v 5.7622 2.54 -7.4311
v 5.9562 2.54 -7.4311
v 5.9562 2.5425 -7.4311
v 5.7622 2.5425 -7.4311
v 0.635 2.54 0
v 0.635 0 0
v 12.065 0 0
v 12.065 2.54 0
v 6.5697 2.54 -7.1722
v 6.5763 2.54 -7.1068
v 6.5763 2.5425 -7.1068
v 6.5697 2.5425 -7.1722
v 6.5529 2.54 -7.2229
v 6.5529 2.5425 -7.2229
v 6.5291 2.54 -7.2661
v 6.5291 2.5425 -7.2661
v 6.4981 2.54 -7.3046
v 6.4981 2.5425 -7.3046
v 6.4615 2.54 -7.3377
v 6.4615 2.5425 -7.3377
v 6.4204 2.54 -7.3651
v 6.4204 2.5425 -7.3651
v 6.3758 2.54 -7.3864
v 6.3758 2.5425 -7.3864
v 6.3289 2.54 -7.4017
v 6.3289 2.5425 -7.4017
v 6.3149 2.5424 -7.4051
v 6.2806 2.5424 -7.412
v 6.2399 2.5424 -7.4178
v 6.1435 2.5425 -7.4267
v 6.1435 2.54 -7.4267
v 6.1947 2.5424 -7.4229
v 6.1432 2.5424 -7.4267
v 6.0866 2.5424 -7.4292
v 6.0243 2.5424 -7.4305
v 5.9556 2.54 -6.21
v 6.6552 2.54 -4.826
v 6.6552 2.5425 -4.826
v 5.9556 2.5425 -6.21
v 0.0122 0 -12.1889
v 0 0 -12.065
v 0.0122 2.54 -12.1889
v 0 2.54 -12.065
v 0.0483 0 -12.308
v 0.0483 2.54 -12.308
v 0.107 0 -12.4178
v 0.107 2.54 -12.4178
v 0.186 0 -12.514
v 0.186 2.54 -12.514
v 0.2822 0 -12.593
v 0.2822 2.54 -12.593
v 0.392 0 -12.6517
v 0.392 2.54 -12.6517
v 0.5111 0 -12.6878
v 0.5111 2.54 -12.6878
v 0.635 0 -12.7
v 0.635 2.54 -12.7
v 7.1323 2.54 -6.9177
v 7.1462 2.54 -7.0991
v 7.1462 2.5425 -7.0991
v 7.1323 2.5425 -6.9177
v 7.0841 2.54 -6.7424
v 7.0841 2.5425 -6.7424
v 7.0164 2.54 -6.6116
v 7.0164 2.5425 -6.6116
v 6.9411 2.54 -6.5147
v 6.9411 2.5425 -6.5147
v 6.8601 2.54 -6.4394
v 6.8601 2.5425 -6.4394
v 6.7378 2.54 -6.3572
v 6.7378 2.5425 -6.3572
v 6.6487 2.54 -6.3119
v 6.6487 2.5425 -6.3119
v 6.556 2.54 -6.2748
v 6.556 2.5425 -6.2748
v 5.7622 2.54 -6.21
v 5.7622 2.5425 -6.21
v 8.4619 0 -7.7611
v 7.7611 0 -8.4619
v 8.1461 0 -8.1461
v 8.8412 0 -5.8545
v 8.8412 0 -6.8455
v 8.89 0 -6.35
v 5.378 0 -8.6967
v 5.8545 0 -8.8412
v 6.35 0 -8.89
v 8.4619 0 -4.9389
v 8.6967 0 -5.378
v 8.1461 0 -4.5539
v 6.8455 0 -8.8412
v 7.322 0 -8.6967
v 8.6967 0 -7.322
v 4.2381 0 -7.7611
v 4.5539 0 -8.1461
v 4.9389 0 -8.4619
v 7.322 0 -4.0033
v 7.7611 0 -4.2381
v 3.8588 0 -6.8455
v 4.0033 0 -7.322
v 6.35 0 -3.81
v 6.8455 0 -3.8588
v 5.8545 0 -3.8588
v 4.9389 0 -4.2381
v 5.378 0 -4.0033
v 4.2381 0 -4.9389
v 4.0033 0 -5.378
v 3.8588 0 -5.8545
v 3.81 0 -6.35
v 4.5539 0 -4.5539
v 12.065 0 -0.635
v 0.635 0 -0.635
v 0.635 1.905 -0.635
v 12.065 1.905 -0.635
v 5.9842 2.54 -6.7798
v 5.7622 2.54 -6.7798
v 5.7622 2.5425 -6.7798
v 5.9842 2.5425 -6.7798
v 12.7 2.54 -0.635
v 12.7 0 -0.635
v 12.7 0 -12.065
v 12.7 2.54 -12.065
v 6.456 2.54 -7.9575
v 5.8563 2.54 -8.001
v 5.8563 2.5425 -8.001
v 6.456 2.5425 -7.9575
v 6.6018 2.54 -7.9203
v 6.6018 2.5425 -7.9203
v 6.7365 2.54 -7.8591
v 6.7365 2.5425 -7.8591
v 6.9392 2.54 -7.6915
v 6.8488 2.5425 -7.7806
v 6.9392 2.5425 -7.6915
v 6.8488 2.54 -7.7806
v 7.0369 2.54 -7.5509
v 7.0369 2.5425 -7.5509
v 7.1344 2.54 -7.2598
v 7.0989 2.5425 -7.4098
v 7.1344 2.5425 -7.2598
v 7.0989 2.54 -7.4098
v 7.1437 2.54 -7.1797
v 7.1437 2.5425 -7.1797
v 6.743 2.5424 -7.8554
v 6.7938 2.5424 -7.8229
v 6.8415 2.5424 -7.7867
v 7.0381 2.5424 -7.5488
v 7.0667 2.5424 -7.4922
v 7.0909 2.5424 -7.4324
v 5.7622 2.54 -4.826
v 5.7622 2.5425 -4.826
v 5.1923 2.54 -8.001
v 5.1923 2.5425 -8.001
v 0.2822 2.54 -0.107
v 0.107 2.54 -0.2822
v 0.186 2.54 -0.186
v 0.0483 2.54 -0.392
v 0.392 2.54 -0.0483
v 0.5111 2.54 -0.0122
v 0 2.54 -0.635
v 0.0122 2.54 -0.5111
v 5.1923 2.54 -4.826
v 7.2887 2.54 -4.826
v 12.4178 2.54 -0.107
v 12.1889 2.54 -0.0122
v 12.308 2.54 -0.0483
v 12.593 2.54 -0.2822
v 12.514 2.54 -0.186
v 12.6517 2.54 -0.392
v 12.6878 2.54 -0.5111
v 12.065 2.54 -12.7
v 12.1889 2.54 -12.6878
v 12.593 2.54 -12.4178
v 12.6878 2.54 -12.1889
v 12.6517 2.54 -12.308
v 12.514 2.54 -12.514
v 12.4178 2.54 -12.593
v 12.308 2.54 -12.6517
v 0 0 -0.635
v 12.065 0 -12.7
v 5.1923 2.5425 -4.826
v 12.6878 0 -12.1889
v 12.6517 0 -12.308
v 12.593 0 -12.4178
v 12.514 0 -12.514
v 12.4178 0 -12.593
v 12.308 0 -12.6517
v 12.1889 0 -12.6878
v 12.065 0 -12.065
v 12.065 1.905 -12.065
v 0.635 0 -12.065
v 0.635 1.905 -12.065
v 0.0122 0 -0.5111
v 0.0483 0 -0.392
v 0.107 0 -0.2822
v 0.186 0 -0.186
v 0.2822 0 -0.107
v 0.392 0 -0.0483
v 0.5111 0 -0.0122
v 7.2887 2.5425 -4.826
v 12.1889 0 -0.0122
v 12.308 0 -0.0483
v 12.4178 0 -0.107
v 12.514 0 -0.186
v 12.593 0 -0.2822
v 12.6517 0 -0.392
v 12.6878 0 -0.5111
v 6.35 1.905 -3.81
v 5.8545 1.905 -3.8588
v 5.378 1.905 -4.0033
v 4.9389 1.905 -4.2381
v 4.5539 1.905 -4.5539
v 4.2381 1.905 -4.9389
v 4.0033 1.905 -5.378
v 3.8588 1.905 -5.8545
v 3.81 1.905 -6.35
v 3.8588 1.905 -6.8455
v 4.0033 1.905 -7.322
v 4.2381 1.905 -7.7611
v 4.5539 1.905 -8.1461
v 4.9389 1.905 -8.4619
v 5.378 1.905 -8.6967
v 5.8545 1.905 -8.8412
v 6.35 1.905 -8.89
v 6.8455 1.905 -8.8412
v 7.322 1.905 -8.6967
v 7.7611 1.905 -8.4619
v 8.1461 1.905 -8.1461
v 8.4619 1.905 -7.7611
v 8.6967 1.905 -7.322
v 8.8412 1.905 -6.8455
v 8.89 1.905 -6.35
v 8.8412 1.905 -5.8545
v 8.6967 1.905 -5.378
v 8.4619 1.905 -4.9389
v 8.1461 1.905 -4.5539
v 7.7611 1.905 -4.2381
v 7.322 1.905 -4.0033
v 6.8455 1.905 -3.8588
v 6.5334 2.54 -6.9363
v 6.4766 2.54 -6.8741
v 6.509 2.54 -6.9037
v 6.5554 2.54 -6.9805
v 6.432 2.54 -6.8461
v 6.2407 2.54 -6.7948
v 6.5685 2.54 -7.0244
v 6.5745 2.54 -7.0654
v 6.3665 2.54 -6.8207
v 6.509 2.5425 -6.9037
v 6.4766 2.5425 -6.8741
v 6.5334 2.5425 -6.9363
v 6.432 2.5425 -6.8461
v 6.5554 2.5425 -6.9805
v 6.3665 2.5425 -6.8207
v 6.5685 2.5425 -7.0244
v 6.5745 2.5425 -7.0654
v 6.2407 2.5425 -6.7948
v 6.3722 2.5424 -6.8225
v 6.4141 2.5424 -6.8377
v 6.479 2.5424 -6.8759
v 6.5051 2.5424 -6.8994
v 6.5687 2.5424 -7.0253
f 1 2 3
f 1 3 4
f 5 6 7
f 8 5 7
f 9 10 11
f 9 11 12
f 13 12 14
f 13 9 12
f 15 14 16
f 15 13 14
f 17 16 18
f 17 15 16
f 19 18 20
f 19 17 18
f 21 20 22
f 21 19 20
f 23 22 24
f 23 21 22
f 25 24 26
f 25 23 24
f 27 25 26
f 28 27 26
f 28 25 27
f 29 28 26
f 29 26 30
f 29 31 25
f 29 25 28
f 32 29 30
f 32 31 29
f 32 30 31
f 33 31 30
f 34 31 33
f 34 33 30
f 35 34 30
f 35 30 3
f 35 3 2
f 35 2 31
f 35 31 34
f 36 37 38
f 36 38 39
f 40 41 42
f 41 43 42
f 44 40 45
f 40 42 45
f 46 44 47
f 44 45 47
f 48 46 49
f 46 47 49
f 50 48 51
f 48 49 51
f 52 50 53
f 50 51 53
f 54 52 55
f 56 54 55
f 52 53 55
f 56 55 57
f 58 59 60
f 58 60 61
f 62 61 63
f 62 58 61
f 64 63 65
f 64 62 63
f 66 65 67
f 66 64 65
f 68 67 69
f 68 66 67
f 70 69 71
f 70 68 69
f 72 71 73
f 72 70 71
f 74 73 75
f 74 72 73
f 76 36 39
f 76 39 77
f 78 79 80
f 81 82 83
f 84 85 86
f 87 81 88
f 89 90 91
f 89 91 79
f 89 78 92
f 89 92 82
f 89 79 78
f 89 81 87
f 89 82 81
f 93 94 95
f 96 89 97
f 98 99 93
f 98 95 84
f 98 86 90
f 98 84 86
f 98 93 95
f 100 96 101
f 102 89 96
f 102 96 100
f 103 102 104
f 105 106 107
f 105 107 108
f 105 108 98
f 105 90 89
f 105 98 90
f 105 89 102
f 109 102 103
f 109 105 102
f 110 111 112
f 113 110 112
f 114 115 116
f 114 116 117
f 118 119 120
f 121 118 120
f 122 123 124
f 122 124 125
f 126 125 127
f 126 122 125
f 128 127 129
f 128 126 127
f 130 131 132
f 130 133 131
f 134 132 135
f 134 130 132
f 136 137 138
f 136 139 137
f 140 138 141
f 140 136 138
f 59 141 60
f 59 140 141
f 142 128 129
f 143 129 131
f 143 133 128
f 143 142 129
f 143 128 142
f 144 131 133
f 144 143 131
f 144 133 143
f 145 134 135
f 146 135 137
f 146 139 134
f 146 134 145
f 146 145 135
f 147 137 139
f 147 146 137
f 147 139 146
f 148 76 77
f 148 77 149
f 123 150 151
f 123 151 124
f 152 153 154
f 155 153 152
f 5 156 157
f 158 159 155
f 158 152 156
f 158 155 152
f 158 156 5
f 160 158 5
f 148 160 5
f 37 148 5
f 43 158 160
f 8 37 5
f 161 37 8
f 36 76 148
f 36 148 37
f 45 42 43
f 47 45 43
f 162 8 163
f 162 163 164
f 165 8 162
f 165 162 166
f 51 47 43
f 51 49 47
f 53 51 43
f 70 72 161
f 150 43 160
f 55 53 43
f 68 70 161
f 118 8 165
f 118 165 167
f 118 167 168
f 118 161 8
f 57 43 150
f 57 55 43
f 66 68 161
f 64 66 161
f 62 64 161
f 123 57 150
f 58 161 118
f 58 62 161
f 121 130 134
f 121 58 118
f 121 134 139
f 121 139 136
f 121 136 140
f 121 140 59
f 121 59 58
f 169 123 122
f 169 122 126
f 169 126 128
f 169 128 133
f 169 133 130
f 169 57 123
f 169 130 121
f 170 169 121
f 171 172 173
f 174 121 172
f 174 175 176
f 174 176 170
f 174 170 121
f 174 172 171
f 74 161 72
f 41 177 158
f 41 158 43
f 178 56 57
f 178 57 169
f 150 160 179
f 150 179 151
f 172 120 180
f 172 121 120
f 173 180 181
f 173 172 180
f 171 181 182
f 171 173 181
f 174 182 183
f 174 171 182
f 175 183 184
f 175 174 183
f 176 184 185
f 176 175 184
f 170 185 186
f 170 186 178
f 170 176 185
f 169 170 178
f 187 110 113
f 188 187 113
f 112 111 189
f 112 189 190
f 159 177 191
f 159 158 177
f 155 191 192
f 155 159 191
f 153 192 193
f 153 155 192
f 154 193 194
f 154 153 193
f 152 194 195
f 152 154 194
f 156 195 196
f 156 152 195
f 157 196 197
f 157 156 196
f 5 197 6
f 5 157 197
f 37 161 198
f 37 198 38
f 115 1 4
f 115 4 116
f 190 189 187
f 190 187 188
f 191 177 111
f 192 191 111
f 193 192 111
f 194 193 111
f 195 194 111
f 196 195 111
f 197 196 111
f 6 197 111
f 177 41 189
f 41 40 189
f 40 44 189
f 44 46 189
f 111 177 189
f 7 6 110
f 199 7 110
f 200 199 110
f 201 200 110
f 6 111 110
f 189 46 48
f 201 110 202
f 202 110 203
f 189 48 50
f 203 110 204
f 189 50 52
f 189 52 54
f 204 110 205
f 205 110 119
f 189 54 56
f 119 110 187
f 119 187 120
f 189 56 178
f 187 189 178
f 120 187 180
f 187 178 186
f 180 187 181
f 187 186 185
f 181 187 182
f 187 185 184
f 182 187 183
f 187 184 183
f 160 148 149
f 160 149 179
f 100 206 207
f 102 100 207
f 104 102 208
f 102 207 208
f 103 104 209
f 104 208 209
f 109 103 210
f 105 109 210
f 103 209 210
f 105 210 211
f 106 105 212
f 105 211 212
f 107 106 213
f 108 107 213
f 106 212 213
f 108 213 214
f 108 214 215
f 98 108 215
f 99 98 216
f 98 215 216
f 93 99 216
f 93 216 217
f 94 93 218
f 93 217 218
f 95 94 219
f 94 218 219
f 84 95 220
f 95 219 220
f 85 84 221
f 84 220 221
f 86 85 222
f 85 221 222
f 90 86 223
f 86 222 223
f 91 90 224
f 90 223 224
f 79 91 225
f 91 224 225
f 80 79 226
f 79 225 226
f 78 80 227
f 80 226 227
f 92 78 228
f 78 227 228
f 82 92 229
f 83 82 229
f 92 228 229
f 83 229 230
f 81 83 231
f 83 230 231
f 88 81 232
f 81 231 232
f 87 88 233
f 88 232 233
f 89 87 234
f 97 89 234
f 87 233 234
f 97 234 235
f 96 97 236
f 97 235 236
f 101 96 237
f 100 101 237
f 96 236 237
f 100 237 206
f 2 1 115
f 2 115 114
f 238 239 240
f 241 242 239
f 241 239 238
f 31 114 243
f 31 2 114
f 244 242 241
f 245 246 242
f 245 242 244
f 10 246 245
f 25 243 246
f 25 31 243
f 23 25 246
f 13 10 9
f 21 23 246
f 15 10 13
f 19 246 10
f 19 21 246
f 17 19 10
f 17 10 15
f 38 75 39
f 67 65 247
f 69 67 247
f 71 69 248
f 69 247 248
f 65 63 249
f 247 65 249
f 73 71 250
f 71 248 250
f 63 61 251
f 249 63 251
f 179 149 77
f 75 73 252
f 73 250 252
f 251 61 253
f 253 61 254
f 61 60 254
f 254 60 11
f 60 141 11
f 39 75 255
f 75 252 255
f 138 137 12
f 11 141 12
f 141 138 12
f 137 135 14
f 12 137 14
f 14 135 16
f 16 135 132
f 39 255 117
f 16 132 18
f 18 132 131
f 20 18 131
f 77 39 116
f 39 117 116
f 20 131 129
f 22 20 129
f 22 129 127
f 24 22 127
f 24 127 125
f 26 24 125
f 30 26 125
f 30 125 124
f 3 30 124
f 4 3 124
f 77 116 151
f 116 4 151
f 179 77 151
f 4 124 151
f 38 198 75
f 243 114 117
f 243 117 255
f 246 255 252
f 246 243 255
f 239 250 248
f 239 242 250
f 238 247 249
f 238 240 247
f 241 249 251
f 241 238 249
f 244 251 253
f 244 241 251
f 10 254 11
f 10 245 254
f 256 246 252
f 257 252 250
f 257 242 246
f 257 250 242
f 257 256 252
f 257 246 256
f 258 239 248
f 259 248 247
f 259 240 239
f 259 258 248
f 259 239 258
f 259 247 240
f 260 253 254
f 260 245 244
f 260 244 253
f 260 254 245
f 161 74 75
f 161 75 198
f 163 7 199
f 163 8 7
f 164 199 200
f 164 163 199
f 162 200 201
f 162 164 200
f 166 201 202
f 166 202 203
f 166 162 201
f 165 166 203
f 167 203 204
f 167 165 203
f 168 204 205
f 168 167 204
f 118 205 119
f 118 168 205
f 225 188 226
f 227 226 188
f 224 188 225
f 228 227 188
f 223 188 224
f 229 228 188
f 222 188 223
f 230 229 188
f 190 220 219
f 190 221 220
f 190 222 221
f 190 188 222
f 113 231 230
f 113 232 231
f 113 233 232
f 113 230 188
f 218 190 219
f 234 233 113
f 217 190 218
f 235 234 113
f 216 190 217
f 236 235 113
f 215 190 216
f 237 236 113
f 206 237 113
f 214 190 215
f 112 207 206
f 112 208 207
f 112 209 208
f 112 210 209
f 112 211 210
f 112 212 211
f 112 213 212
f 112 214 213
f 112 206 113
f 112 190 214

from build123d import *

# Parameters (mm, degrees)
SKETCH1_W           = 12.7
SKETCH1_H           = 12.7
BOSS_EXTRUDE1_DEPTH = 2.54
FILLET1_R           = 0.635
SHELL1_START        = 0.635
SHELL1_OUTLINE_W    = 1.905
SHELL1_OUTLINE_H    = 11.43
SHELL1_DEPTH        = 11.43
SKETCH2_R           = 2.54
BOSS_EXTRUDE2_DEPTH = 1.905
BOSS_EXTRUDE3_DEPTH = 0.00254


# Read off the part's stored shape, not the designer's step: Shell1
with BuildPart() as part:
    # Sketch1 → Boss-Extrude1 (new body)
    with BuildSketch(Plane(origin=(0, 0, 0), x_dir=(1, 0, 0), z_dir=(0, 1, 0))):
        with Locations((6.35, 6.35)):
            Rectangle(SKETCH1_W, SKETCH1_H)
    extrude(amount=BOSS_EXTRUDE1_DEPTH)

    # Fillet1
    fillet1_edges = [part.edges().sort_by_distance(p)[0] for p in [
        (0, 1.27, -12.7),
        (12.7, 1.27, -12.7),
        (12.7, 1.27, 0),
        (0, 1.27, 0),
    ]]
    fillet(fillet1_edges, radius=FILLET1_R)

    # Shell1 outline → Shell1 (cut)
    with BuildSketch(Plane.YZ.offset(SHELL1_START)):
        with Locations((0.9525, -6.35)):
            Rectangle(SHELL1_OUTLINE_W, SHELL1_OUTLINE_H)
    extrude(amount=SHELL1_DEPTH, mode=Mode.SUBTRACT)

    # Sketch2 → Boss-Extrude2 (add)
    with BuildSketch(Plane(origin=(0, 1.905, 0), x_dir=(-1, 0, 0), z_dir=(0, -1, 0))):
        with Locations(Location((-6.35, 6.35, 0), (0, 0, 270))):
            Circle(SKETCH2_R)
    extrude(amount=BOSS_EXTRUDE2_DEPTH)

    # Sketch3 → Boss-Extrude3 (add)
    with BuildSketch(Plane(origin=(0, 2.54, 0), x_dir=(1, 0, 0), z_dir=(0, 1, 0))):
        with BuildLine():
            Line((5.192346154, 8.001), (5.856348558, 8.001))
            add(Edge.make_bspline(
                [(5.856348558, 8.001), (5.900238914, 8.000844214), (5.984652434, 8.000544595), (6.106372118, 7.995817392), (6.218188387, 7.989239101), (6.320266796, 7.979200455), (6.412563672, 7.965890424), (6.49517152, 7.950200099), (6.568087924, 7.93231761), (6.631927834, 7.910034619), (6.689540196, 7.884899742), (6.743242928, 7.856019307), (6.79422079, 7.823714908), (6.842133051, 7.787136528), (6.887396081, 7.746942202), (6.93009527, 7.703091473), (6.969627239, 7.655212502), (7.005747205, 7.603607826), (7.038667646, 7.54932089), (7.067762412, 7.492277157), (7.091422324, 7.432436959), (7.112328392, 7.370665114), (7.127386356, 7.306078583), (7.13785895, 7.239306125), (7.145526573, 7.170112696), (7.145967424, 7.123105753), (7.146192308, 7.099127003)],
                knots=[0, 0, 0, 0, 1.749336639, 3.364467119, 4.854658419, 6.213483162, 7.451590619, 8.570285859, 9.5643256, 10.440900261, 11.26203566, 12.067320669, 12.869050712, 13.665104639, 14.467235401, 15.27997916, 16.102287765, 16.939272006, 17.78853747, 18.631303466, 19.488103222, 20.351255419, 21.228522269, 22.127379805, 23.044756219, 24, 24, 24, 24], degree=3))
            add(Edge.make_bspline(
                [(7.146192308, 7.099127003), (7.145608142, 7.074098697), (7.1444627, 7.025022751), (7.138292723, 6.952934188), (7.127015945, 6.883964894), (7.109935624, 6.818316801), (7.090304013, 6.755172843), (7.064199007, 6.695698066), (7.034736927, 6.639027495), (6.999745675, 6.585962756), (6.961344486, 6.535325176), (6.916684711, 6.489054868), (6.868659617, 6.444664978), (6.814569539, 6.404935939), (6.756798818, 6.367181417), (6.694199611, 6.332965765), (6.627180461, 6.301428881), (6.580062679, 6.283841737), (6.555967949, 6.274848157)],
                knots=[0, 0, 0, 0, 1.099860209, 2.156625411, 3.176576793, 4.16617041, 5.135385252, 6.078461593, 7.016046972, 7.938469504, 8.868247731, 9.803980173, 10.76021508, 11.73834243, 12.748633912, 13.790971185, 14.870363756, 16, 16, 16, 16], degree=3))
            Line((6.555967949, 6.274848157), (7.288660256, 4.826))
            Line((7.288660256, 4.826), (6.655186699, 4.826))
            Line((6.655186699, 4.826), (5.955567308, 6.209974359))
            Line((5.955567308, 6.209974359), (5.762217949, 6.209974359))
            Line((5.762217949, 6.209974359), (5.762217949, 4.826))
            Line((5.762217949, 4.826), (5.192346154, 4.826))
            Line((5.192346154, 4.826), (5.192346154, 8.001))
        make_face()
        with BuildLine():
            Line((5.762217949, 6.779846154), (5.984188101, 6.779846154))
            add(Edge.make_bspline(
                [(5.984188101, 6.779846154), (6.011325797, 6.780151797), (6.063288654, 6.780737037), (6.138018068, 6.783451626), (6.205890197, 6.789992443), (6.267196508, 6.798256521), (6.322245489, 6.807798593), (6.370546122, 6.82147296), (6.412842646, 6.836125392), (6.448633846, 6.854334563), (6.479213025, 6.87504234), (6.505616188, 6.898566889), (6.52745539, 6.92579356), (6.545430168, 6.955982448), (6.55941259, 6.989400567), (6.569618687, 7.025681062), (6.575322386, 7.065237214), (6.575978616, 7.092536345), (6.576320513, 7.106759215)],
                knots=[0, 0, 0, 0, 1.688639943, 3.233382647, 4.650958383, 5.928841754, 7.082724185, 8.122798841, 9.049171256, 9.863274652, 10.613301712, 11.341792392, 12.054588806, 12.776240173, 13.521029143, 14.301969904, 15.115324896, 16, 16, 16, 16], degree=3))
            add(Edge.make_bspline(
                [(6.576320513, 7.106759215), (6.575674126, 7.123585908), (6.57440442, 7.15663883), (6.561804988, 7.204223447), (6.541749414, 7.248266266), (6.514258716, 7.28856829), (6.479637754, 7.323899827), (6.43990747, 7.355044858), (6.394210387, 7.379672018), (6.351898327, 7.39591583), (6.313404242, 7.405634671), (6.278664546, 7.412877065), (6.238435767, 7.418009958), (6.192687537, 7.423454304), (6.14153647, 7.426984687), (6.08470376, 7.429561163), (6.022352631, 7.430615326), (5.978887972, 7.430952323), (5.956203325, 7.431128205)],
                knots=[0, 0, 0, 0, 1.020303359, 2.004196876, 2.966617323, 3.9489082, 4.950758222, 5.960522915, 7.003732012, 8.091992268, 8.70421221, 9.413913587, 10.24622431, 11.166358409, 12.212345909, 13.359657661, 14.621978493, 16, 16, 16, 16], degree=3))
            Line((5.956203325, 7.431128205), (5.762217949, 7.431128205))
            Line((5.762217949, 7.431128205), (5.762217949, 6.779846154))
        make_face(mode=Mode.SUBTRACT)
    extrude(amount=BOSS_EXTRUDE3_DEPTH)


solid = part.part
